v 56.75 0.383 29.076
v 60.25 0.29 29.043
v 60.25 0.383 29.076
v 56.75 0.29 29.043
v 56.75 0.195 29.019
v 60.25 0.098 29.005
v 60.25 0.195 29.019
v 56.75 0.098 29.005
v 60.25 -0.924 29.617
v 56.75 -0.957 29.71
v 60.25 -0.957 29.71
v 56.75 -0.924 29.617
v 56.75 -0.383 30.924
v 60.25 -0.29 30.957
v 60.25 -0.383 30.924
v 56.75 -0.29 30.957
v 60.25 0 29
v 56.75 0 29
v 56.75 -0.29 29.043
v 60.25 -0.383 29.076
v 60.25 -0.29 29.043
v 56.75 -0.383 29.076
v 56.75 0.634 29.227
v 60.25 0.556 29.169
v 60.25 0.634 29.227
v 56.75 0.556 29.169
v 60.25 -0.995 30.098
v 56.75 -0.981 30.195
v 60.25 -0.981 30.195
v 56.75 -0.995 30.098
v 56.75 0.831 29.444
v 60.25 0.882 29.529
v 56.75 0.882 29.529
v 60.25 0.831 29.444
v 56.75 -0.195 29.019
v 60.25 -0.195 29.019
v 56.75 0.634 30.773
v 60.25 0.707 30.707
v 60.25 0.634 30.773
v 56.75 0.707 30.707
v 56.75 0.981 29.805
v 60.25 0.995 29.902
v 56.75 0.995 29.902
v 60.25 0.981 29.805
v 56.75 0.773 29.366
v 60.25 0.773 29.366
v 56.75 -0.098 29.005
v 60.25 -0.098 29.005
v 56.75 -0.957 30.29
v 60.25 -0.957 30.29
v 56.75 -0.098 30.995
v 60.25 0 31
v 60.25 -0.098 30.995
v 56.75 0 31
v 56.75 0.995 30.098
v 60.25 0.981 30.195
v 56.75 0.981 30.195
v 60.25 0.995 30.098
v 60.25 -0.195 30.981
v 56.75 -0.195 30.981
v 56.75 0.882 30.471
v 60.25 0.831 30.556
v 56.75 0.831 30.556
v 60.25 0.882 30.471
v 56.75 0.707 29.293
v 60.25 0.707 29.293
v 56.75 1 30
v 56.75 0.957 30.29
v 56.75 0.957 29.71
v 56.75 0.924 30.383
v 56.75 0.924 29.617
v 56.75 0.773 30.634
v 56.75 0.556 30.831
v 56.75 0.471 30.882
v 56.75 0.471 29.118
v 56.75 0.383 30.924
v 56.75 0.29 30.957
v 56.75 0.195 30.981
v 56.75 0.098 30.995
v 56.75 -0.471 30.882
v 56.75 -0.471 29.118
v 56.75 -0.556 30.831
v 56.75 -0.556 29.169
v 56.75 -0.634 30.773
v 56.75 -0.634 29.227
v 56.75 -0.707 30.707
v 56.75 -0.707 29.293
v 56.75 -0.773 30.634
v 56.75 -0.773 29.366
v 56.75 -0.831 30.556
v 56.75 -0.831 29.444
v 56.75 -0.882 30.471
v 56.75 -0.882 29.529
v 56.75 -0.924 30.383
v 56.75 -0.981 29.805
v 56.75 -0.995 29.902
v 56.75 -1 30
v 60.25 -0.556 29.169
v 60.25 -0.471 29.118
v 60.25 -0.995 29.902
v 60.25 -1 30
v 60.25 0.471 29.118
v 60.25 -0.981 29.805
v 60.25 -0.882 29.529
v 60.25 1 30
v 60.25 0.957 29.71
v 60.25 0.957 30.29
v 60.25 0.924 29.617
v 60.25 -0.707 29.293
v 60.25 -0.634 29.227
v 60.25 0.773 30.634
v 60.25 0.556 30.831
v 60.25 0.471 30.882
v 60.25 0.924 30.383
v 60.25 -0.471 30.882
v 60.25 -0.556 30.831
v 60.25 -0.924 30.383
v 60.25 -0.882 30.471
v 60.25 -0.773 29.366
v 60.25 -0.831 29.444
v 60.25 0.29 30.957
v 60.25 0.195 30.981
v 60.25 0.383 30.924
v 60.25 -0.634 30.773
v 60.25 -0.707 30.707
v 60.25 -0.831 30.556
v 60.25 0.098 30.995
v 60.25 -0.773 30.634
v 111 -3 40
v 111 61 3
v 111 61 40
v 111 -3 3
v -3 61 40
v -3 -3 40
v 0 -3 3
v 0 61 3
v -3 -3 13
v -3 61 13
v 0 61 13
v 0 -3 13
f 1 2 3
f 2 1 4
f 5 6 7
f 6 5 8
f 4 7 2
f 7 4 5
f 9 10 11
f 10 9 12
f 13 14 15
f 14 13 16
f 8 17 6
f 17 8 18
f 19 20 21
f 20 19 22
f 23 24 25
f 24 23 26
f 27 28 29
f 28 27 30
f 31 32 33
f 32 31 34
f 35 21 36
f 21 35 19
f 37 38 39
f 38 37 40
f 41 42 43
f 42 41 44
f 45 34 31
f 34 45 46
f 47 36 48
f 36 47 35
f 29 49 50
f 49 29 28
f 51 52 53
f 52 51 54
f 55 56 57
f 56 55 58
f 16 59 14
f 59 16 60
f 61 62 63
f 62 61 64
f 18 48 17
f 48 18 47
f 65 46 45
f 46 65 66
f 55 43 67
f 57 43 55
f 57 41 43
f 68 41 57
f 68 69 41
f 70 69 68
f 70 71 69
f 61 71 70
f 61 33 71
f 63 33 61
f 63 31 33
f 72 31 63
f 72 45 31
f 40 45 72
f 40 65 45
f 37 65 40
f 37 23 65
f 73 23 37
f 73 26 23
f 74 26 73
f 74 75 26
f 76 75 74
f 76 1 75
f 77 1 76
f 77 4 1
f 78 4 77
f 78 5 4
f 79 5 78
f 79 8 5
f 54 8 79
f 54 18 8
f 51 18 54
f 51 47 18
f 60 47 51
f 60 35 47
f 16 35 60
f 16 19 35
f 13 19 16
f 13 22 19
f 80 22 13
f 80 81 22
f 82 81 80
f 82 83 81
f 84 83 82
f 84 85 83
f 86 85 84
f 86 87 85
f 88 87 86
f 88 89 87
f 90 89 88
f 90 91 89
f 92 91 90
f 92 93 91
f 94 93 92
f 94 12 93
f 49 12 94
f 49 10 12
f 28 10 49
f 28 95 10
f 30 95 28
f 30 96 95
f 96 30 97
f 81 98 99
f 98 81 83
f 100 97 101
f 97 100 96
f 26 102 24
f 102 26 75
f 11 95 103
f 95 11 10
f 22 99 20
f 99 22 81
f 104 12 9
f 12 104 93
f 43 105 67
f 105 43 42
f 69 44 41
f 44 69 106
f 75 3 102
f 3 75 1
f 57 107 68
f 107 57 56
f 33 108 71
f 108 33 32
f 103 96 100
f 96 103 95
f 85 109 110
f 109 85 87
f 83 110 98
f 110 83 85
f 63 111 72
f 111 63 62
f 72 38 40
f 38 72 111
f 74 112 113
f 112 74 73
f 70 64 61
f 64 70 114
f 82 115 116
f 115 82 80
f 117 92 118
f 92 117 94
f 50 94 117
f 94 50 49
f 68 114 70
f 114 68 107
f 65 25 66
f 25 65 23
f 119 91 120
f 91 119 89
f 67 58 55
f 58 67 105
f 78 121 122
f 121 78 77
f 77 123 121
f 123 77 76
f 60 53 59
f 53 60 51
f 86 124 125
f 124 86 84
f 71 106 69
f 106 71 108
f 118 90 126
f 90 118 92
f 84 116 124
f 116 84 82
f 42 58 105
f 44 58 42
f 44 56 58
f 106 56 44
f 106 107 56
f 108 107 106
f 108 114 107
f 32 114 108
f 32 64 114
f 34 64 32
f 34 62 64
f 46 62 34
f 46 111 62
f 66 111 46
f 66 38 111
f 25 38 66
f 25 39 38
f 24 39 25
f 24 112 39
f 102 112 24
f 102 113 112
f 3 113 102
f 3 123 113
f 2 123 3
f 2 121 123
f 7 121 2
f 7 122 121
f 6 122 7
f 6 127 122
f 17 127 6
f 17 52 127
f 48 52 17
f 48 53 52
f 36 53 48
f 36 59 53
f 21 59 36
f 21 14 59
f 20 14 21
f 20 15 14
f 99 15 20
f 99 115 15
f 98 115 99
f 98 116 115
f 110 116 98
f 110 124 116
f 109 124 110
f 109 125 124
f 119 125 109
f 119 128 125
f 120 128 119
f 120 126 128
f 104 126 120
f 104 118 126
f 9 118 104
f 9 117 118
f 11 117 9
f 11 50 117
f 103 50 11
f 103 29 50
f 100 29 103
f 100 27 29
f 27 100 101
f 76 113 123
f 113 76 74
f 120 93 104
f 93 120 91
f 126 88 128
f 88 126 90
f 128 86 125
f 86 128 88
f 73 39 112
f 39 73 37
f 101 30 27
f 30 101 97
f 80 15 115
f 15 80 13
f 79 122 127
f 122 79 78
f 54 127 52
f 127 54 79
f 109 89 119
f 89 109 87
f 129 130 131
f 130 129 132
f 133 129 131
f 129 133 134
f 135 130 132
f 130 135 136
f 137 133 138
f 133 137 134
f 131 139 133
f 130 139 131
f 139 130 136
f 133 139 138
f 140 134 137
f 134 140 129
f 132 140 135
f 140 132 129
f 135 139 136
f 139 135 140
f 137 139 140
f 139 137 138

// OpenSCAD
// Mini horizontal gel-electrophoresis buffer tank
// Print orientation: open top facing up, floor on the bed (z = 0)

// ---------------- Parameters ----------------
tank_x      = 120;   // outer length along X (mm)
tank_y      = 70;    // outer width along Y (mm)
tank_z      = 40;    // outer height along Z (mm)

wall        = 3;     // wall thickness (mm)
floor       = 3;     // floor thickness (mm)

platform_x  = 60;    // platform length along X (mm), centred
platform_w  = tank_y; // platform width along Y (full inner width)
platform_top = 10;   // height of platform top above outer floor (mm)

hole_d      = 2;     // electrode hole diameter (mm)
hole_y      = 0;     // electrode hole Y position (mm)
hole_z      = 30;    // electrode hole height above outer floor (mm)

eps         = 0.5;   // cutter overshoot past faces (mm)

$fn = 64;

// ---------------- Derived ----------------
inner_x = tank_x - 2 * wall;   // inner length (X)
inner_y = tank_y - 2 * wall;   // inner width (Y)
inner_z = tank_z - floor;      // inner height above floor (Z)

// ---------------- Model ----------------
difference() {
    // Outer tank shell (open top)
    translate([-wall, -wall, floor])
        cube([inner_x, inner_y, tank_z - floor]);

    // Central raised platform for gel tray
    translate([-wall, -wall, floor])
        cube([wall, platform_w, platform_top]);

    // Electrode holes through each end wall, along X
    for (s = [-1, 1])
        translate([s * (tank_x / 2 - wall / 2), hole_y, hole_z])
            rotate([0, 90, 0])
                cylinder(d = hole_d, h = wall + eps, center = true);
}
